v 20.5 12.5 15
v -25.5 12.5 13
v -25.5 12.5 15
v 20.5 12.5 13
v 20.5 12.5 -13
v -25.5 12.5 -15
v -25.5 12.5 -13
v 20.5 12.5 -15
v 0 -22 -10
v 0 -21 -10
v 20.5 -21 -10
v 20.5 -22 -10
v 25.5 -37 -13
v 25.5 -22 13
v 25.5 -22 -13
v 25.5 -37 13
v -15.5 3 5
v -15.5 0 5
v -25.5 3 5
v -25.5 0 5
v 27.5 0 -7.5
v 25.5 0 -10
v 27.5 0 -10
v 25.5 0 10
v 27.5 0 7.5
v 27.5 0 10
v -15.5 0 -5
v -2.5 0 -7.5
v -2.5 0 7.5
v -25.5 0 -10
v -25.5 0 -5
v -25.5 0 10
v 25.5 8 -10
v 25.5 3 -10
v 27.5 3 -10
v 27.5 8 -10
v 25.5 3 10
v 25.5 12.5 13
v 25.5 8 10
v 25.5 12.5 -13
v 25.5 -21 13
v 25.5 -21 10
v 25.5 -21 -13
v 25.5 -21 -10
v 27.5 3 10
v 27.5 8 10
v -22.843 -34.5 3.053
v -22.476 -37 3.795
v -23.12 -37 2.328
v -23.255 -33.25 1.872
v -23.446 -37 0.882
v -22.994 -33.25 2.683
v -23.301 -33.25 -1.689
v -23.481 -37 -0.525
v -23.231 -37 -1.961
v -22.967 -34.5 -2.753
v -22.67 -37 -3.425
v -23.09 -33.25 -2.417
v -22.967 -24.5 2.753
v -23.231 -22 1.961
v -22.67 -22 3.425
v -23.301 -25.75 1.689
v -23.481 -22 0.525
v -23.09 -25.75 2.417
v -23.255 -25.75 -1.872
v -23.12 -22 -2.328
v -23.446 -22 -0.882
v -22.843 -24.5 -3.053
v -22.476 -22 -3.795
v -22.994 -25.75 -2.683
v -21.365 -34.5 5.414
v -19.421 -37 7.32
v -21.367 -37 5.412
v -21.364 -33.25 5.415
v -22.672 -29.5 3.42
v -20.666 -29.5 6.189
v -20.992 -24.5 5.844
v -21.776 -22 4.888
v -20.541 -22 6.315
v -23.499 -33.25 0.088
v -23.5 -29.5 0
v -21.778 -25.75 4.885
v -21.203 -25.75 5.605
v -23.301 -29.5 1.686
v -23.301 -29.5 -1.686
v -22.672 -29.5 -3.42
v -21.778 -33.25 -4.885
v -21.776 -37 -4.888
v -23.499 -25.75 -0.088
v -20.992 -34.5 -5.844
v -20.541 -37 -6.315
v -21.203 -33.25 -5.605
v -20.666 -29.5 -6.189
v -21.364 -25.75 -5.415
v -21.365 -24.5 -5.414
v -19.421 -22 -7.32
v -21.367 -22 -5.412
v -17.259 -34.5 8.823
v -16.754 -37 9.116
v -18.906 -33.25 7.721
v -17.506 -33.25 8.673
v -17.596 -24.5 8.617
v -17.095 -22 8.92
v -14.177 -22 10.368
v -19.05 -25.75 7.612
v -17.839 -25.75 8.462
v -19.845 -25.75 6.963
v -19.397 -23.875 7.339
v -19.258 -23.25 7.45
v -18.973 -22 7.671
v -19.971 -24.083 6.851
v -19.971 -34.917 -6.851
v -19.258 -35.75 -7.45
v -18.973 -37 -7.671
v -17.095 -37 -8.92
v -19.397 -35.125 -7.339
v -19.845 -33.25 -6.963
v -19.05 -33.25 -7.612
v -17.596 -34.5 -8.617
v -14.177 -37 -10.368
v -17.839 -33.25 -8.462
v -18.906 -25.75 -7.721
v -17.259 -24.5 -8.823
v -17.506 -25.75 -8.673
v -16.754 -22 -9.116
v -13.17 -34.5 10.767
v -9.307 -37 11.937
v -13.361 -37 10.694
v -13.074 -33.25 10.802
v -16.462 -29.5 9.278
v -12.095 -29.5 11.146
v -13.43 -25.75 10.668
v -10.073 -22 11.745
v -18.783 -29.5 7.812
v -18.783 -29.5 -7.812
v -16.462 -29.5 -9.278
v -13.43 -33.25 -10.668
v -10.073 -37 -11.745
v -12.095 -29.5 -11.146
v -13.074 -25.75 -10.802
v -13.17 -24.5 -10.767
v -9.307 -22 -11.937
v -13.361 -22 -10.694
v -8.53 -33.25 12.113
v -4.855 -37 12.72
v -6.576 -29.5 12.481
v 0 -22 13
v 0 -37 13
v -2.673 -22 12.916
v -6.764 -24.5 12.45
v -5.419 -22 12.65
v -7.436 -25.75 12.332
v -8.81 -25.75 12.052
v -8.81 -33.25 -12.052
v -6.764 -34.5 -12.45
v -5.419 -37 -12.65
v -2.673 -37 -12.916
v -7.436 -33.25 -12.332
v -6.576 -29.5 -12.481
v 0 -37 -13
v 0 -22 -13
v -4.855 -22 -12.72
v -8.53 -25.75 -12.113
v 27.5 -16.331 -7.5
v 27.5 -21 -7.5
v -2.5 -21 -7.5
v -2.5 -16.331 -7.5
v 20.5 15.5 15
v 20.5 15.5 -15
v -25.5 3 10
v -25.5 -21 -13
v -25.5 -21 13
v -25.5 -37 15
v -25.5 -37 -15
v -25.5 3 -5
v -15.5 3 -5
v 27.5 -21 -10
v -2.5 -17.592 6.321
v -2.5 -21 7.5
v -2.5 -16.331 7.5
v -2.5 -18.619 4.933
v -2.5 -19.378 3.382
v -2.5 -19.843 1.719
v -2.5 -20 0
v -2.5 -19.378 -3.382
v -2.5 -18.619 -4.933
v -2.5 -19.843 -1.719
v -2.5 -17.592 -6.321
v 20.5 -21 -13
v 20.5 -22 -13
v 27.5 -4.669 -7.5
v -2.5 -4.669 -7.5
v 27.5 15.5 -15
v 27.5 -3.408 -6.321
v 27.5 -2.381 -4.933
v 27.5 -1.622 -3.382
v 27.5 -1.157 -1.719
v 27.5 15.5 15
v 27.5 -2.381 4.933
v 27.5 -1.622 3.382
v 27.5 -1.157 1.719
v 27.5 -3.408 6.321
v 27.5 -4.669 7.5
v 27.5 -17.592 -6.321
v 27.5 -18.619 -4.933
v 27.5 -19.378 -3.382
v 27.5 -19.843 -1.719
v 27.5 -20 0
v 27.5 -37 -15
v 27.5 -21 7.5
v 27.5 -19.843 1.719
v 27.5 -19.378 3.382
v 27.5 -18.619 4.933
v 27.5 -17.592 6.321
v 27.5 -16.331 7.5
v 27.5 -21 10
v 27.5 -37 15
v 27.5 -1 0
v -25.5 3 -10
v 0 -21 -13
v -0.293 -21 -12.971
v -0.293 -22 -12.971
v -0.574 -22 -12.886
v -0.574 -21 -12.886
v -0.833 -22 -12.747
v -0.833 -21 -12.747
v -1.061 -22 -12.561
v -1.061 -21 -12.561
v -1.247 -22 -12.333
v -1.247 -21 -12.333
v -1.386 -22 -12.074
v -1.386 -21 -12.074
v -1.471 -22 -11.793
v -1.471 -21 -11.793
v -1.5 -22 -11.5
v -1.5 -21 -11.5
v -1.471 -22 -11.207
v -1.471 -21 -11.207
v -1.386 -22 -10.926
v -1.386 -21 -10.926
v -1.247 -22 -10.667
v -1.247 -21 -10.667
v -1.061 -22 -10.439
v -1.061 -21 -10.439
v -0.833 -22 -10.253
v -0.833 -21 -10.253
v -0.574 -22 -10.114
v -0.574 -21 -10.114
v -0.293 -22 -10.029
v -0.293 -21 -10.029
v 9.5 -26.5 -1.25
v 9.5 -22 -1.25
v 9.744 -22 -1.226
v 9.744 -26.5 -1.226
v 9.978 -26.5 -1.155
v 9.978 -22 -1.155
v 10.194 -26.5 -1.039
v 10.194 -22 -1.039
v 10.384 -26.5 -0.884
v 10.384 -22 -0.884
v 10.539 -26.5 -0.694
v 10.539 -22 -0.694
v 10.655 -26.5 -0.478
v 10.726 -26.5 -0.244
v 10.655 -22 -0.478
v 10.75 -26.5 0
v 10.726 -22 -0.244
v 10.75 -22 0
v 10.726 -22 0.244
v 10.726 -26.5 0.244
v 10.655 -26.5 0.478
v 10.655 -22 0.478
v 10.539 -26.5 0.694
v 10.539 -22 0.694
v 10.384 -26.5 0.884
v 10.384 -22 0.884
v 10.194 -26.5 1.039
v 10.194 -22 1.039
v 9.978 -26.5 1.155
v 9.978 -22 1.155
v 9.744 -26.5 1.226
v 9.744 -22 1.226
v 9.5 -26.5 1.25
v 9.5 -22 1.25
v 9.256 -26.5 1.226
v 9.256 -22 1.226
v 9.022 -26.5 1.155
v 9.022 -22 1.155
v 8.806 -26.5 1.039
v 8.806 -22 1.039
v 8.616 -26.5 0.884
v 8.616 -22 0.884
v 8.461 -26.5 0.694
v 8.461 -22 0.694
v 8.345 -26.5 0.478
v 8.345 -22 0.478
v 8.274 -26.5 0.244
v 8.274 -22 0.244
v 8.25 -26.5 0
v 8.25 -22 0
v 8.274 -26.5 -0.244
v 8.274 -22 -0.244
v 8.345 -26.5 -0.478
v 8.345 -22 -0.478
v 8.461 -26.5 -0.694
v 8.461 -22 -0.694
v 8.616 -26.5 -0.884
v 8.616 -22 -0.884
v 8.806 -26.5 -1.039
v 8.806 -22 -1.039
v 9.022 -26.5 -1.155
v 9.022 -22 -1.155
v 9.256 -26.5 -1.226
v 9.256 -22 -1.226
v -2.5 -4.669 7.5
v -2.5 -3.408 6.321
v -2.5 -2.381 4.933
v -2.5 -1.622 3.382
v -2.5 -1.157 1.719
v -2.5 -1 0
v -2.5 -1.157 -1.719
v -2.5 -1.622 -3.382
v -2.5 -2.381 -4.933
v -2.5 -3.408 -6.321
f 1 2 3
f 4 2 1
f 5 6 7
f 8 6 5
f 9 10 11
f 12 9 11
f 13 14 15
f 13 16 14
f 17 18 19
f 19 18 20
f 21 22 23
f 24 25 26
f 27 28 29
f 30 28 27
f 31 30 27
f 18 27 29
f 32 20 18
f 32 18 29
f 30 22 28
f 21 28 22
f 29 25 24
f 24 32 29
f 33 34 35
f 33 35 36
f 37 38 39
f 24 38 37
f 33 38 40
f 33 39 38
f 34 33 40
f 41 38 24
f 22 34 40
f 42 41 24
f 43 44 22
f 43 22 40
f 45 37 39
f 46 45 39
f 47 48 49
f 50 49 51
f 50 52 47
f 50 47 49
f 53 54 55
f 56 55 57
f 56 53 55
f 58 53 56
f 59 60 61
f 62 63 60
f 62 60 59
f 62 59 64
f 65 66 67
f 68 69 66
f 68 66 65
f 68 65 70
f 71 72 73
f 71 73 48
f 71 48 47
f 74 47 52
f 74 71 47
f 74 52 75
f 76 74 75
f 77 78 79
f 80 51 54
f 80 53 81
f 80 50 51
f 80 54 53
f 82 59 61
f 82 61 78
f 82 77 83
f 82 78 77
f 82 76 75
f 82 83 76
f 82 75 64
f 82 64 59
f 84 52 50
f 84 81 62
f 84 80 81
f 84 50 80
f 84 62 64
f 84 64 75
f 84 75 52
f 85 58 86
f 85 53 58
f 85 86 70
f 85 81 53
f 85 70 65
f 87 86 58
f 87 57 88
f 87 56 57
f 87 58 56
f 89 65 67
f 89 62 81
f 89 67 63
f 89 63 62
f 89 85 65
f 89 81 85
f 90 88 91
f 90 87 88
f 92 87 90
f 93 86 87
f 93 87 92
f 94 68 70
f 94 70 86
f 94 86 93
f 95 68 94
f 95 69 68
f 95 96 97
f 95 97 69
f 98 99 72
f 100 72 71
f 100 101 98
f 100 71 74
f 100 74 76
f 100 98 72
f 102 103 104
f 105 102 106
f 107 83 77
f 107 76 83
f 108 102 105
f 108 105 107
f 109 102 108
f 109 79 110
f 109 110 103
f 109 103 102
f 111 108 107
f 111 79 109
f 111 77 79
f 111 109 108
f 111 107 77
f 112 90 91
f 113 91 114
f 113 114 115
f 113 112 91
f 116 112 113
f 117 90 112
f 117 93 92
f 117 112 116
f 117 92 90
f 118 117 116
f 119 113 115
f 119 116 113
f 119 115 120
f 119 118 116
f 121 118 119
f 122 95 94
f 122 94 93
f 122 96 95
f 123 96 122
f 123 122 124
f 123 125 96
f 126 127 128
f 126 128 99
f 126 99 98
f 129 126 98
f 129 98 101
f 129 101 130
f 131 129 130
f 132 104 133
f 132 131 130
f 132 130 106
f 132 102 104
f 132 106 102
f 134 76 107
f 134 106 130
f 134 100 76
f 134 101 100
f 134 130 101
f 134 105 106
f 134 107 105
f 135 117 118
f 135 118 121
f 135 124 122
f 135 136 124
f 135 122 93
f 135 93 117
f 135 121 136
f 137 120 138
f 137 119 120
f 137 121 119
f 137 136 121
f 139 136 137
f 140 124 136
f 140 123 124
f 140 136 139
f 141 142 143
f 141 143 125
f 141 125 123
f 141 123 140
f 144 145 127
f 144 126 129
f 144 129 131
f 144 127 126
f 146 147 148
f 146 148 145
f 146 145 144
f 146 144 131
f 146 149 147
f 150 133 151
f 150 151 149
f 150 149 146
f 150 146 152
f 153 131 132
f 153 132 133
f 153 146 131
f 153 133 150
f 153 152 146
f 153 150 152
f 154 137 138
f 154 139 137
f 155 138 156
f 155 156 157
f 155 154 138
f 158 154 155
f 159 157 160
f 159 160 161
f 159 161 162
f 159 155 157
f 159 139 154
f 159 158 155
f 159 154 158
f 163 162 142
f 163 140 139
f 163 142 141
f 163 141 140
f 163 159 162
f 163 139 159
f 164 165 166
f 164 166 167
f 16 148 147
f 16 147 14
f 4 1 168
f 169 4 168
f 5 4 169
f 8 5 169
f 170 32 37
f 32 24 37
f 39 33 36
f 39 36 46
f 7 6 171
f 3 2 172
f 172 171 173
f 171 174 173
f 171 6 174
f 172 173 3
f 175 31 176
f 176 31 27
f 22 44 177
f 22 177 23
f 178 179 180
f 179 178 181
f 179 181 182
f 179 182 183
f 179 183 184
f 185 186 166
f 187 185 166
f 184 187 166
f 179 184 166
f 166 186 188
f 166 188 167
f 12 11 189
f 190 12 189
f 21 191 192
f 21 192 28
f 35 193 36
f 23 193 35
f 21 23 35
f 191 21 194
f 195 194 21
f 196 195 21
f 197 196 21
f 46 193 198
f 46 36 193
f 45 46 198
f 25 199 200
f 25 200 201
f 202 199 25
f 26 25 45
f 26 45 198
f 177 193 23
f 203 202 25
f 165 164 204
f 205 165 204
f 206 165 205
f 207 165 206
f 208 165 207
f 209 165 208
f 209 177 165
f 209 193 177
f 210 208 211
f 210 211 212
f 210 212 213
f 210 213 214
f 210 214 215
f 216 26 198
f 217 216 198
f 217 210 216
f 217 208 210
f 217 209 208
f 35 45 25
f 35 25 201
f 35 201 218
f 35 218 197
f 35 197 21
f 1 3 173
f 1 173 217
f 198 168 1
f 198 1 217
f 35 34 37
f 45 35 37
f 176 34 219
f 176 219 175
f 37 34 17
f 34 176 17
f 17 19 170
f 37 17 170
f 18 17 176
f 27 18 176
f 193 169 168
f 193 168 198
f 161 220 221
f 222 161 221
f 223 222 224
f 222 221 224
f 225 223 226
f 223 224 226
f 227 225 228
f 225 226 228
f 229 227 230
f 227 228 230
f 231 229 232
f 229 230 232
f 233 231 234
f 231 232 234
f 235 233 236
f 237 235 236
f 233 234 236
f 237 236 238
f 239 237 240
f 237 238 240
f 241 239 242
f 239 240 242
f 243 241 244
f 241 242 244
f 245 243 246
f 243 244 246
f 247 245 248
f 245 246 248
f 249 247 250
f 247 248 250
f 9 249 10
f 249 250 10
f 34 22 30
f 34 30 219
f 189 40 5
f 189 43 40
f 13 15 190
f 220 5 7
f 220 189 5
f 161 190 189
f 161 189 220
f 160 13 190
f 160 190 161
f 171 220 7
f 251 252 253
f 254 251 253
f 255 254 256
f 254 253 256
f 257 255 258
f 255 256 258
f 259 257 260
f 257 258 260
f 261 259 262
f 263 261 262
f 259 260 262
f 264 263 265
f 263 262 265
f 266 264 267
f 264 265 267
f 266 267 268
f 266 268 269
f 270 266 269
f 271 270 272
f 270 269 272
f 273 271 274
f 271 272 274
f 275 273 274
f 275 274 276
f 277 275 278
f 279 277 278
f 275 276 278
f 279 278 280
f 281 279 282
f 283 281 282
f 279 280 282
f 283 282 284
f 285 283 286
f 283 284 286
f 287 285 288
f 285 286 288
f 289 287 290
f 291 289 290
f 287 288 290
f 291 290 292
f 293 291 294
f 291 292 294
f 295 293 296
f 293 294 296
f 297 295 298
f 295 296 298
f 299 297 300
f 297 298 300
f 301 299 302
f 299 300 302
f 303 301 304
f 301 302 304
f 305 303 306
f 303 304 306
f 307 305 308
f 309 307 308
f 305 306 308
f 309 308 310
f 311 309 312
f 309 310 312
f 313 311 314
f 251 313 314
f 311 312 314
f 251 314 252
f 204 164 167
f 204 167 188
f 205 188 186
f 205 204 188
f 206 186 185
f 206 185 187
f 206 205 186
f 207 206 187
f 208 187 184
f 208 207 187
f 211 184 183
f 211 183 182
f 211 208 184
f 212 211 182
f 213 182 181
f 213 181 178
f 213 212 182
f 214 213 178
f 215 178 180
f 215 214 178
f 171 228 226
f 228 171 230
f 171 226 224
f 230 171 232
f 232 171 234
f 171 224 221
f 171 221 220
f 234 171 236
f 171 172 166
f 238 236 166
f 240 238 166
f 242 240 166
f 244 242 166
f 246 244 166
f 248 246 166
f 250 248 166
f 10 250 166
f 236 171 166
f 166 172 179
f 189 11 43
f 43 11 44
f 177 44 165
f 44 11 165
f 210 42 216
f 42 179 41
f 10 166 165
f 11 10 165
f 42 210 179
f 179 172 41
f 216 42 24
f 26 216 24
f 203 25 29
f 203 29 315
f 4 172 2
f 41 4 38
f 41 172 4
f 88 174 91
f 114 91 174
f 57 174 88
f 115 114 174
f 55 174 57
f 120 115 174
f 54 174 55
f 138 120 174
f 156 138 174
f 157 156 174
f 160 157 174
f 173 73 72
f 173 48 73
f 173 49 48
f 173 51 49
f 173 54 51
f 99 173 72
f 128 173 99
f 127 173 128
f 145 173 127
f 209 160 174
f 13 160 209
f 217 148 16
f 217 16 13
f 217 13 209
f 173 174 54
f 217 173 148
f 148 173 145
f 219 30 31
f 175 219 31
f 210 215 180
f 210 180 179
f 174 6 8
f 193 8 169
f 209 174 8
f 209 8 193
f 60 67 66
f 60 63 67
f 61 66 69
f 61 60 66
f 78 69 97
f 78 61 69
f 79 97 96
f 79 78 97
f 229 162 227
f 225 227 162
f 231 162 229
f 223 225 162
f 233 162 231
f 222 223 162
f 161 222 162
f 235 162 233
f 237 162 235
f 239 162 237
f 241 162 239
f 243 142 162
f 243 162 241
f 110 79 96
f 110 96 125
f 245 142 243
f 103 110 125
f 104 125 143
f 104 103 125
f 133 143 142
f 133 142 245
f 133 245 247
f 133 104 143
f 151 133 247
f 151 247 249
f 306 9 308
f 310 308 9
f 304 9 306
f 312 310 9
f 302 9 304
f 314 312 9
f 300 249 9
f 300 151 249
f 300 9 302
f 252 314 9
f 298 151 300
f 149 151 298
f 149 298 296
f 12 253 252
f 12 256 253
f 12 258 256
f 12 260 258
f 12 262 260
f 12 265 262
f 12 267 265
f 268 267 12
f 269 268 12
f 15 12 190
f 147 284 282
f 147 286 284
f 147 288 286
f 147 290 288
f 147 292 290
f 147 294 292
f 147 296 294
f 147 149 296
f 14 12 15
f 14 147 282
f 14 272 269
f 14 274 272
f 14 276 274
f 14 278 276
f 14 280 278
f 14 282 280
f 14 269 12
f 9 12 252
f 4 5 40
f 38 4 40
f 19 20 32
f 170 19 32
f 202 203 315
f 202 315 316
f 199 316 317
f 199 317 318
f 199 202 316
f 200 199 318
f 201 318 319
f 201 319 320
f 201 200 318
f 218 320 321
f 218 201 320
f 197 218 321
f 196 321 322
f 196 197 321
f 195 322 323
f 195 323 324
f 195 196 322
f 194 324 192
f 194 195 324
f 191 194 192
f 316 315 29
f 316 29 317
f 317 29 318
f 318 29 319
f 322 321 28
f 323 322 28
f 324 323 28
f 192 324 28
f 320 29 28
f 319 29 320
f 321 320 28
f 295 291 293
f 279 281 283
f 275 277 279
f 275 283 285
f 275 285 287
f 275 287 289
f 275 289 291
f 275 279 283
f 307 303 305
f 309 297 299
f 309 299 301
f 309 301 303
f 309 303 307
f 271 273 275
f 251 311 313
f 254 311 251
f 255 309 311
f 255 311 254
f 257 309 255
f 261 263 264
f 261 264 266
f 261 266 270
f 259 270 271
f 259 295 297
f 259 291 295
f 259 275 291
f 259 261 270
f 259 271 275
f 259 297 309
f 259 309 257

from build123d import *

# Parameters (mm, degrees)
SKETCH1_W            = 51
SKETCH1_H            = 2
SKETCH1_W_2          = 2
BOSS_EXTRUDE1_DEPTH  = 12.5
BOSS_EXTRUDE2_DEPTH  = 3
SKETCH3_W            = 20
SKETCH3_H            = 5
CUT_EXTRUDE1_DEPTH   = 3
SKETCH4_W            = 7
SKETCH4_H            = 30
BOSS_EXTRUDE3_DEPTH  = 3
SKETCH5_W            = 20
SKETCH5_H            = 22
SKETCH5_W_2          = 18
SKETCH5_H_2          = 20
BOSS_EXTRUDE4_DEPTH  = 43
SKETCH6_R            = 1.25
BOSS_EXTRUDE5_DEPTH  = 4.5
SKETCH8_W            = 53
SKETCH8_H            = 30
BOSS_EXTRUDE9_DEPTH  = 15
SKETCH8_6_W          = 2
SKETCH8_6_H          = 2
BOSS_EXTRUDE10_DEPTH = 22
SKETCH9_W            = 53
SKETCH9_H            = 30
BOSS_EXTRUDE11_DEPTH = 1
SKETCH10_W           = 20
SKETCH10_H           = 21
CUT_EXTRUDE2_DEPTH   = 59.677082571
BOSS_EXTRUDE14_DEPTH = 30
SKETCH14_R           = 1.5
SKETCH14_W           = 20.5
SKETCH14_H           = 3
CUT_EXTRUDE4_DEPTH   = 49.098856624


with BuildPart() as part:
    # Sketch1 → Boss-Extrude1 (new body)
    with BuildSketch(Plane(origin=(0, 0, 0), x_dir=(1, 0, 0), z_dir=(0, 1, 0))):
        with Locations((0, -14)):
            Rectangle(SKETCH1_W, SKETCH1_H)
        with Locations((26.5, -14)):
            Rectangle(SKETCH1_W_2, SKETCH1_H)
        Polygon((25.5, -10), (25.5, -13), (27.5, -13), (27.5, 13), (25.5, 13), (25.5, 10), align=None)
        with Locations((0, 14)):
            Rectangle(SKETCH1_W, SKETCH1_H)
        with Locations((26.5, 14)):
            Rectangle(SKETCH1_W_2, SKETCH1_H)
    extrude(amount=BOSS_EXTRUDE1_DEPTH)

    # Sketch1<3> → Boss-Extrude2 (add)
    with BuildSketch(Plane(origin=(0, 0, 0), x_dir=(1, 0, 0), z_dir=(0, 1, 0))):
        Polygon((-25.5, -5), (-25.5, -10), (25.5, -10), (25.5, 10), (-25.5, 10), (-25.5, 5), (-15.5, 5), (-15.5, -5), align=None)
    extrude(amount=BOSS_EXTRUDE2_DEPTH)

    # Sketch3 → Cut-Extrude1 (cut)
    with BuildSketch(Plane.ZY.offset(-25.5)):
        with Locations((0, 5.5)):
            Rectangle(SKETCH3_W, SKETCH3_H)
    extrude(amount=-CUT_EXTRUDE1_DEPTH, mode=Mode.SUBTRACT)

    # Sketch4 → Boss-Extrude3 (add)
    with BuildSketch(Plane(origin=(0, 12.5, 0), x_dir=(1, 0, 0), z_dir=(0, 1, 0))):
        with Locations((24, 0)):
            Rectangle(SKETCH4_W, SKETCH4_H)
    extrude(amount=BOSS_EXTRUDE3_DEPTH)

    # Sketch5 → Boss-Extrude4 (add)
    with BuildSketch(Plane(origin=(27.5, 0, 0), x_dir=(0, 0, -1), z_dir=(1, 0, 0))):
        with Locations((0, -11)):
            Rectangle(SKETCH5_W, SKETCH5_H)
        with Locations((0, -11)):
            Rectangle(SKETCH5_W_2, SKETCH5_H_2, mode=Mode.SUBTRACT)
    extrude(amount=-BOSS_EXTRUDE4_DEPTH)

    # Sketch6 → Boss-Extrude5 (add)
    with BuildSketch(Plane.XZ.offset(22)):
        with Locations(Location((9.5, 0, 0), (0, 0, 270))):
            Circle(SKETCH6_R)
    extrude(amount=BOSS_EXTRUDE5_DEPTH)



with BuildPart() as body_2:
    # Sketch8 → Boss-Extrude9 (new body)
    with BuildSketch(Plane.XZ.offset(22)):
        with Locations((1, 0)):
            Rectangle(SKETCH8_W, SKETCH8_H)
        with BuildLine():
            add(Edge.make_bspline(
                [(0, 13), (-23.5, 13), (-23.5, 0)],
                knots=[4.71238898, 4.71238898, 4.71238898, 6.283185307, 6.283185307, 6.283185307], degree=2, weights=[1, 0.707106781, 1]))
            Line((0, 13), (25.5, 13))
            Line((25.5, 13), (25.5, -13))
            Line((25.5, -13), (0, -13))
            add(Edge.make_bspline(
                [(-23.5, 0), (-23.5, -13), (0, -13)],
                knots=[0, 0, 0, 1.570796327, 1.570796327, 1.570796327], degree=2, weights=[1, 0.707106781, 1]))
        make_face(mode=Mode.SUBTRACT)
    extrude(amount=BOSS_EXTRUDE9_DEPTH)


with BuildPart() as part_1:
    add(part.part)

    add(body_2.part)  # Boss-Extrude10 merges body 2
    # Sketch8<6> → Boss-Extrude10 (add)
    with BuildSketch(Plane.XZ.offset(22)):
        Polygon((-23.5, -15), (25.5, -15), (25.5, -13), (0, -13), (-23.5, -13), align=None)
        Polygon((25.5, 13), (25.5, 15), (-23.5, 15), (-23.5, 13), (0, 13), align=None)
        with Locations((-24.5, -14)):
            Rectangle(SKETCH8_6_W, SKETCH8_6_H)
        with Locations((-24.5, 14)):
            Rectangle(SKETCH8_6_W, SKETCH8_6_H)
        Polygon((27.5, 10), (27.5, 15), (25.5, 15), (25.5, 13), (25.5, 10), align=None)
        Polygon((27.5, -15), (27.5, -10), (25.5, -10), (25.5, -13), (25.5, -15), align=None)
    extrude(amount=-BOSS_EXTRUDE10_DEPTH)

    # Sketch9 → Boss-Extrude11 (add)
    with BuildSketch(Plane.XZ.offset(22)):
        with Locations((1, 0)):
            Rectangle(SKETCH9_W, SKETCH9_H)
    extrude(amount=-BOSS_EXTRUDE11_DEPTH)

    # Sketch10 → Cut-Extrude2 (cut, through all)
    with BuildSketch(Plane.ZY.offset(15.5)):
        with Locations((0, -10.5)):
            Rectangle(SKETCH10_W, SKETCH10_H)
    extrude(amount=-CUT_EXTRUDE2_DEPTH, mode=Mode.SUBTRACT)

    # Sketch12 → Boss-Extrude14 (add)
    with BuildSketch(Plane(origin=(27.5, 0, 0), x_dir=(0, 0, -1), z_dir=(1, 0, 0))):
        with BuildLine():
            Line((-7.5, 0), (-7.5, -4.669048105))
            ThreePointArc((-7.5, -4.669048105), (0, -1), (7.5, -4.669048105))
            Line((7.5, -4.669048105), (7.5, 0))
            Line((7.5, 0), (-7.5, 0))
        make_face()
        with BuildLine():
            Line((-7.5, -16.330951895), (-7.5, -21))
            Line((-7.5, -21), (7.5, -21))
            Line((7.5, -21), (7.5, -16.330951895))
            ThreePointArc((7.5, -16.330951895), (0, -20), (-7.5, -16.330951895))
        make_face()
    extrude(amount=-BOSS_EXTRUDE14_DEPTH)

    # Sketch14 → Cut-Extrude4 (cut, through all)
    with BuildSketch(Plane(origin=(0, -21, 0), x_dir=(1, 0, 0), z_dir=(0, 1, 0))):
        with Locations((0, 11.5)):
            Circle(SKETCH14_R)
        with Locations((10.25, 11.5)):
            Rectangle(SKETCH14_W, SKETCH14_H)
    extrude(amount=-CUT_EXTRUDE4_DEPTH, mode=Mode.SUBTRACT)


solid = part_1.part
